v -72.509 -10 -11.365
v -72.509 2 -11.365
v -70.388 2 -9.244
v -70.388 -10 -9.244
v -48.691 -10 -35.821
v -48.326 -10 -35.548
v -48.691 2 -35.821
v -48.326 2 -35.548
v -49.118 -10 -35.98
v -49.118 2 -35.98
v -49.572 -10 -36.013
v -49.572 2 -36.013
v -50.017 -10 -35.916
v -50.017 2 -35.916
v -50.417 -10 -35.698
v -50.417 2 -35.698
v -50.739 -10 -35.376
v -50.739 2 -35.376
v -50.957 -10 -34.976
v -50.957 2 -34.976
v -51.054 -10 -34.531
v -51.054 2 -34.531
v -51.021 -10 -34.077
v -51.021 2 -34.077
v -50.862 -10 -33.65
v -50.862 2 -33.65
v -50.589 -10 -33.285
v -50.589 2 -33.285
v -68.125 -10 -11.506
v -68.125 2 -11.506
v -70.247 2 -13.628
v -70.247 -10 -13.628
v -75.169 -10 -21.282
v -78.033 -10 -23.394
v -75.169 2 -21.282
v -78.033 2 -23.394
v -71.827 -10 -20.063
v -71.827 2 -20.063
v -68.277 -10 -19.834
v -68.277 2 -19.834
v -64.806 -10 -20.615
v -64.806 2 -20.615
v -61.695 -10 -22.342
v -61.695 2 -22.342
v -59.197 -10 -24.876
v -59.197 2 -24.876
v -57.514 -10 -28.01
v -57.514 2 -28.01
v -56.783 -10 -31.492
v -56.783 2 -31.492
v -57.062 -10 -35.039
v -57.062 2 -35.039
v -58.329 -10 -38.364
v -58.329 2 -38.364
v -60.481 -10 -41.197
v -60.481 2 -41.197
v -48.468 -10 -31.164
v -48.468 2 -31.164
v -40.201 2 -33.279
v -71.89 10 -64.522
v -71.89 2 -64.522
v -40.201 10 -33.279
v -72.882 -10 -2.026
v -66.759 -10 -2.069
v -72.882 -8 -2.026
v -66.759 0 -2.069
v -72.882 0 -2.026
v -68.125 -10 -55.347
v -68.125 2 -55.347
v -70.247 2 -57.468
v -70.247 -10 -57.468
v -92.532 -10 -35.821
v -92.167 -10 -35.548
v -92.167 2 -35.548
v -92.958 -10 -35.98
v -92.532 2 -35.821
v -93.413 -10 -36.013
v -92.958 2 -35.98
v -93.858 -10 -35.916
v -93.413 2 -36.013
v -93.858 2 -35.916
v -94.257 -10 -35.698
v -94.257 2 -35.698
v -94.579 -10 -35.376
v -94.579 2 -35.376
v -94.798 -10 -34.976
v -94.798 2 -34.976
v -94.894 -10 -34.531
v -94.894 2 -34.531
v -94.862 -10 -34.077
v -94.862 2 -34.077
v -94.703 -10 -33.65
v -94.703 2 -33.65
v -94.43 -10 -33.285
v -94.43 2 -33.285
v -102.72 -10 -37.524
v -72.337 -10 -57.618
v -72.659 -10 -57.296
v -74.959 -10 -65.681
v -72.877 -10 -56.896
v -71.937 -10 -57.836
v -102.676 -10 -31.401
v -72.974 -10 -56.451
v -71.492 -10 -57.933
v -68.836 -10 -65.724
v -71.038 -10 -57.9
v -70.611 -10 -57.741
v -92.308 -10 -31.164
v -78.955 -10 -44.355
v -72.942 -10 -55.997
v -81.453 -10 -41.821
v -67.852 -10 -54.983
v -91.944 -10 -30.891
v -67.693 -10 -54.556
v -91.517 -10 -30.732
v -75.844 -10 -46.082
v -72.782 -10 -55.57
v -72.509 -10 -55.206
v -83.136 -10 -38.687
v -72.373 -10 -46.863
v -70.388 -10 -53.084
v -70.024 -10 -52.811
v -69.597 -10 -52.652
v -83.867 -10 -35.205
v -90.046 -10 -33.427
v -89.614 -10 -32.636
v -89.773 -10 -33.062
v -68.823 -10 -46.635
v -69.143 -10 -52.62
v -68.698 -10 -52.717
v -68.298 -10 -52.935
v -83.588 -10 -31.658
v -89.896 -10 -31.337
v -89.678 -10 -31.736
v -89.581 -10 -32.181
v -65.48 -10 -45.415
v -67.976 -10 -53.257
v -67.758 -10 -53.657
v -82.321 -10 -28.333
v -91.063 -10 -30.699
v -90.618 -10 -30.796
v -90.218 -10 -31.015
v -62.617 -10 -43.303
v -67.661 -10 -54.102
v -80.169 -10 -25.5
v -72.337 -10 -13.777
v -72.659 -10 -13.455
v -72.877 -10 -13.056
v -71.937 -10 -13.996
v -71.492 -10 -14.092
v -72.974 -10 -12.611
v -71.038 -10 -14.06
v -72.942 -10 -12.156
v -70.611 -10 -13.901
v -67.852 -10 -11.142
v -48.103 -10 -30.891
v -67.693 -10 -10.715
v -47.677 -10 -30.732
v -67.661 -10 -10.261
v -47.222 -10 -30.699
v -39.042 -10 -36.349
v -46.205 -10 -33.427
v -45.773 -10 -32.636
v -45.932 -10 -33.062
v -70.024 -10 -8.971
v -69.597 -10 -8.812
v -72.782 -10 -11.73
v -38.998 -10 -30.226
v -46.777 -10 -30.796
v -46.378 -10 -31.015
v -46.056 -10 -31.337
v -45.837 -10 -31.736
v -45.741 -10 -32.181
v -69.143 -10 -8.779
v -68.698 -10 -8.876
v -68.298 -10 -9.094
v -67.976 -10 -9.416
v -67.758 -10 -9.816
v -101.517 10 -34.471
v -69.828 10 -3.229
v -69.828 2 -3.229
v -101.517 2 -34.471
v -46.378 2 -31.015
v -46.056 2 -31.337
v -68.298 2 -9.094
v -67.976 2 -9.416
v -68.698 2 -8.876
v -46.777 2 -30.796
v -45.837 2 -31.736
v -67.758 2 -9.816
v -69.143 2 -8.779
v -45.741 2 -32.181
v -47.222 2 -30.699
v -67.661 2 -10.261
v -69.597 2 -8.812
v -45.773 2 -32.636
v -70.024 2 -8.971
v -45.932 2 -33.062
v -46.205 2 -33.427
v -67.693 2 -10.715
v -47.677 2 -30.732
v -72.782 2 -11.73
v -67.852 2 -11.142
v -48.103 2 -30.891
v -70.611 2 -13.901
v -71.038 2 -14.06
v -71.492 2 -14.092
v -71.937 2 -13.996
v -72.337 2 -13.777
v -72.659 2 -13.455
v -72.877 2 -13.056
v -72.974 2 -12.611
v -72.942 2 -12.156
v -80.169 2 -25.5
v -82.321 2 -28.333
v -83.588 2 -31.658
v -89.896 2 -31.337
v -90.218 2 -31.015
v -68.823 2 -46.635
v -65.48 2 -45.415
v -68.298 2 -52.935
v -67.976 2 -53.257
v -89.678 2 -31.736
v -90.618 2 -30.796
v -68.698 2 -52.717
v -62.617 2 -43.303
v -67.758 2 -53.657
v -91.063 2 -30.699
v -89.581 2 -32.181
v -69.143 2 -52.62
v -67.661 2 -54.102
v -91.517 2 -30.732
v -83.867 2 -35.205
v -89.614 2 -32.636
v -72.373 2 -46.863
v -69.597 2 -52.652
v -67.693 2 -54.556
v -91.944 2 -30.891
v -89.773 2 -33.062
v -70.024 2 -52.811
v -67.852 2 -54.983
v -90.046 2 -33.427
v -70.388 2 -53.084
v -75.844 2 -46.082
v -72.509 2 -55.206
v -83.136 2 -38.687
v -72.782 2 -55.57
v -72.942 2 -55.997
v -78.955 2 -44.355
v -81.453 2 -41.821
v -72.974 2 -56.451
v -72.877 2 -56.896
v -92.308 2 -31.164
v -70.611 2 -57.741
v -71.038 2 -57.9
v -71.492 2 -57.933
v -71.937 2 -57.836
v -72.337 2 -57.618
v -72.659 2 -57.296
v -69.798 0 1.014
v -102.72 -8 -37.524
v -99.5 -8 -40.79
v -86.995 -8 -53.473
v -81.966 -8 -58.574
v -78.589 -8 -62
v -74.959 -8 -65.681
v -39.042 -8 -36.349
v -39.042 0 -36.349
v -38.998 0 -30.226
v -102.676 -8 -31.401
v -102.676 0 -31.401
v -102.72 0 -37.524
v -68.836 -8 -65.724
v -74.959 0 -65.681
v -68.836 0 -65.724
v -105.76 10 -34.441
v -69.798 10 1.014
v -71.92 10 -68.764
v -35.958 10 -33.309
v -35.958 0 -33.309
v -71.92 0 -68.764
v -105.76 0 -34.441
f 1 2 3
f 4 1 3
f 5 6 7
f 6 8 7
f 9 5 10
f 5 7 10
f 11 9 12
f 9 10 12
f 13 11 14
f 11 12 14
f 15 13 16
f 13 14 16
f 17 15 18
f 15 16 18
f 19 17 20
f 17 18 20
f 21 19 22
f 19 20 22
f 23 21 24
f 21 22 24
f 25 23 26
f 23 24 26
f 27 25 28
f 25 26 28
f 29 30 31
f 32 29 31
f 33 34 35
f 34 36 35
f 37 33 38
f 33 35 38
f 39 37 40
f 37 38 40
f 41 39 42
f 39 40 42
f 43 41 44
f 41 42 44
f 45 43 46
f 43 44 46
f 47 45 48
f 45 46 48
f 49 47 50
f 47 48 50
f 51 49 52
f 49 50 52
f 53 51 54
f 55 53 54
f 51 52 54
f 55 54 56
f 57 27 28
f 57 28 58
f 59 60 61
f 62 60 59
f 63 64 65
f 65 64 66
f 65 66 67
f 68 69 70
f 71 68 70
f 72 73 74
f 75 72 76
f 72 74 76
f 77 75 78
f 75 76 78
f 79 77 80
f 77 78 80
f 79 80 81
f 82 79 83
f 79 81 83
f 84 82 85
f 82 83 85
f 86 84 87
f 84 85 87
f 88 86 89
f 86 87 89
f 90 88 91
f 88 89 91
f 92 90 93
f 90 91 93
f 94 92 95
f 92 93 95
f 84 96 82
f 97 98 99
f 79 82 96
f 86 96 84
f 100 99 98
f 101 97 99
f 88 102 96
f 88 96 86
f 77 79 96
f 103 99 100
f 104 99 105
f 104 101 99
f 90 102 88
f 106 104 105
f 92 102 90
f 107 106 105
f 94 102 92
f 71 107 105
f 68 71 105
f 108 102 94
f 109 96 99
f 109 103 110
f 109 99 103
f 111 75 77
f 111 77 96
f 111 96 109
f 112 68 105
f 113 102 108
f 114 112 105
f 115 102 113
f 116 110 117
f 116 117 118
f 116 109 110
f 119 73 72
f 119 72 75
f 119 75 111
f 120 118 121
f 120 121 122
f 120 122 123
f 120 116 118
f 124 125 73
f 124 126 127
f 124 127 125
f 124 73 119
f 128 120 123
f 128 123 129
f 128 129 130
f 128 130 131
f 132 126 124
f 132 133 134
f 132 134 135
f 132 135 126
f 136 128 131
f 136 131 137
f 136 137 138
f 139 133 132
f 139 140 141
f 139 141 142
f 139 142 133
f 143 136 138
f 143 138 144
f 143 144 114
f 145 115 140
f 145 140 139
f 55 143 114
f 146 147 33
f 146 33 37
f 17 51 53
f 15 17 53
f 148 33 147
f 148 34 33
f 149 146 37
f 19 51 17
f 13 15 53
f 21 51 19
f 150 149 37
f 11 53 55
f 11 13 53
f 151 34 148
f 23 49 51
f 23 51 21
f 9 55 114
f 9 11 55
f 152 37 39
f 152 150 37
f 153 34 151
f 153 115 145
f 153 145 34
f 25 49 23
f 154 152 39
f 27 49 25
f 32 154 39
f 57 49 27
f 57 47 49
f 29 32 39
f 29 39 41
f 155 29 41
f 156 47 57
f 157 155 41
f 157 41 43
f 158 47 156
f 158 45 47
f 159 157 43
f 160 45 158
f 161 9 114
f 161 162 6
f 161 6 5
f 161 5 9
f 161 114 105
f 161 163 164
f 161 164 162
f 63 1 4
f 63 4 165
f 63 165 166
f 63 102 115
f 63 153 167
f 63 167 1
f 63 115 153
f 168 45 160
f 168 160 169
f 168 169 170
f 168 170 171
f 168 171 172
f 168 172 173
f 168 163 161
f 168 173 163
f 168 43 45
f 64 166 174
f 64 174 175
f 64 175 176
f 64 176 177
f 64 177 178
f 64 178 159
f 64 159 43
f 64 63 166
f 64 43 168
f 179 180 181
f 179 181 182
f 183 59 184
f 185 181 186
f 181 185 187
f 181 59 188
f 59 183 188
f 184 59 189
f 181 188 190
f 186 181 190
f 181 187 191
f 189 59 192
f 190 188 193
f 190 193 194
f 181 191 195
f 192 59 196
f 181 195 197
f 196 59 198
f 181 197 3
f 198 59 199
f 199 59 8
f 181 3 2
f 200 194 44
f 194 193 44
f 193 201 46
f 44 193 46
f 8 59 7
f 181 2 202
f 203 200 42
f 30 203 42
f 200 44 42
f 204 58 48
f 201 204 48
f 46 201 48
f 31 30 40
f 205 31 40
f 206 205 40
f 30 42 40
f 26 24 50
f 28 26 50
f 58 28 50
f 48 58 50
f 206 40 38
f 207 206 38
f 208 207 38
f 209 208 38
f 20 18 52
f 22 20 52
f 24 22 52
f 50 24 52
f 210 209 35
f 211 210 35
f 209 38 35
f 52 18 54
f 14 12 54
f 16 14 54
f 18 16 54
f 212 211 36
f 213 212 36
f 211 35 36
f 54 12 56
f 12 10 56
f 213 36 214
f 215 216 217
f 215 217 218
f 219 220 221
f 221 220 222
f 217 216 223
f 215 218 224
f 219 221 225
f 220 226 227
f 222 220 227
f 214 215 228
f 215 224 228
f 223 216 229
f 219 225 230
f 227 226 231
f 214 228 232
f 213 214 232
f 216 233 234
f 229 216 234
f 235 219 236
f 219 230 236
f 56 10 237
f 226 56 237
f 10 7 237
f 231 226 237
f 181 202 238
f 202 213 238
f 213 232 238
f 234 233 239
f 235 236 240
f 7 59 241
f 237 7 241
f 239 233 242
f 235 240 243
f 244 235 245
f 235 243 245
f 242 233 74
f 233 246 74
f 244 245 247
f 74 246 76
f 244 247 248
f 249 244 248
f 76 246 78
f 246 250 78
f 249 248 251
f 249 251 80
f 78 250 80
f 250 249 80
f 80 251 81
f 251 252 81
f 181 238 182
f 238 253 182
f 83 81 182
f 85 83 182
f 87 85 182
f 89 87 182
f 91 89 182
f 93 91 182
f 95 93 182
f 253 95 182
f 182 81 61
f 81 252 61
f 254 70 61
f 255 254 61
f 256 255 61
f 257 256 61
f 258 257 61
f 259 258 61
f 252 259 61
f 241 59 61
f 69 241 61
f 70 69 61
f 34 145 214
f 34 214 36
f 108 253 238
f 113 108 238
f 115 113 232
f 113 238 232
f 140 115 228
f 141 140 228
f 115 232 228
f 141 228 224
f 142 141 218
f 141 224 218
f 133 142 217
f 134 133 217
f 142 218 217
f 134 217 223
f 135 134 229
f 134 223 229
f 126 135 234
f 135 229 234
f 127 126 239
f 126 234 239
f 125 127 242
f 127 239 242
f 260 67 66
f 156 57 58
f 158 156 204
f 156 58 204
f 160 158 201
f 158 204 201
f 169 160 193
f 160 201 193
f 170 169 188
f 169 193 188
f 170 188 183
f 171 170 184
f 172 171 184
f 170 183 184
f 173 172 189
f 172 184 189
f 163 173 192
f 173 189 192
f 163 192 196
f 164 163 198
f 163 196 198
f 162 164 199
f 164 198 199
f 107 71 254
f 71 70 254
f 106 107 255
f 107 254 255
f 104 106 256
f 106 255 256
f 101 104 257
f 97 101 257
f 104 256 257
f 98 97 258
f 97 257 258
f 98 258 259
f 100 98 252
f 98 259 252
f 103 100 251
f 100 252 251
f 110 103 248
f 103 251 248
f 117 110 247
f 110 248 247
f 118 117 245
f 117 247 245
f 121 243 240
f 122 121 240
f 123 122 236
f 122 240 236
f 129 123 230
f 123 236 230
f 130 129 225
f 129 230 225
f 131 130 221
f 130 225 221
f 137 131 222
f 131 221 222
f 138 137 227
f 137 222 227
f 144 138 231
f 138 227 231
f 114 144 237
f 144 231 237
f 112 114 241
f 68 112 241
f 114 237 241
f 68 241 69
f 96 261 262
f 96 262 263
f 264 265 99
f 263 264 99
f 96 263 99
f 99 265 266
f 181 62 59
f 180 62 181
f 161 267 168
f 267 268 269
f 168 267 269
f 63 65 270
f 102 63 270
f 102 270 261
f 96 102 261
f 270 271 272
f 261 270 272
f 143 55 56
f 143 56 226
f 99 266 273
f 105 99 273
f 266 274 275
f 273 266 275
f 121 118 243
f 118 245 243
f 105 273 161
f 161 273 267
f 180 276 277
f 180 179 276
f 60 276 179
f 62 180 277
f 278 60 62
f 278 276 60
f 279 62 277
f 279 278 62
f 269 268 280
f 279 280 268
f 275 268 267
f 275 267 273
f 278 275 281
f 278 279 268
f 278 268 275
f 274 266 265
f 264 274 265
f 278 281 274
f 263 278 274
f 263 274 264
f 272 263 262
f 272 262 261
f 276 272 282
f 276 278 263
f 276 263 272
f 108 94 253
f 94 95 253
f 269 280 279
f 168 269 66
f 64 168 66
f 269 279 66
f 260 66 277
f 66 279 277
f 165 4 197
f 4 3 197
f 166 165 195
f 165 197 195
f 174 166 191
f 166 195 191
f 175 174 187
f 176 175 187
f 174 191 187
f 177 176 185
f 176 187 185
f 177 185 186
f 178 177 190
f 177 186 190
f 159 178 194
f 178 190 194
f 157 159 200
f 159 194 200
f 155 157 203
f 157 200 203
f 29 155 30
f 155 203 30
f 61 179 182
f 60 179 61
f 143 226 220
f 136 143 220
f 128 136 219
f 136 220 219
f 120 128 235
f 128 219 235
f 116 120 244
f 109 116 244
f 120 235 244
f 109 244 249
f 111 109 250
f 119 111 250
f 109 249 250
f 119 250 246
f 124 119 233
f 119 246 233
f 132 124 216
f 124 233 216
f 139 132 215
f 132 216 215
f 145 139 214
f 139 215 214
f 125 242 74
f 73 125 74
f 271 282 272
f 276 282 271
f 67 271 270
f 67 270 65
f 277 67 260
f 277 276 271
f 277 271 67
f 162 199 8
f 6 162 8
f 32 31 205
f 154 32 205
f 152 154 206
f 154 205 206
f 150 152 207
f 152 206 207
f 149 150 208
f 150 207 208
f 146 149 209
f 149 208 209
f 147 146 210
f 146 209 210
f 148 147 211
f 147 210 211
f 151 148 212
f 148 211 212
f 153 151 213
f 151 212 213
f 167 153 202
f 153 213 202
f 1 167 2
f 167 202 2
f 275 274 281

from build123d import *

# Parameters (mm, degrees)
SKETCH1_W                  = 215
SKETCH1_H                  = 140
BOSS_EXTRUDE1_DEPTH        = 10
FILLET1_R                  = 60
SKETCH2_R                  = 20
SKETCH2_R_2                = 7.5
CUT_EXTRUDE1_DEPTH         = 129.671092325
CUT_EXTRUDE2_DEPTH         = 129.671092325
CUT_EXTRUDE3_DEPTH         = 129.671092325
SKETCH5_R                  = 11
CUT_EXTRUDE4_DEPTH         = 7
SKETCH6_R                  = 14
SKETCH6_R_2                = 11
BOSS_EXTRUDE2_DEPTH        = 8.5
SKETCH7_R                  = 23.5
CUT_EXTRUDE5_DEPTH         = 7
SKETCH8_R                  = 38.5
SKETCH8_R_2                = 30.5
BOSS_EXTRUDE3_DEPTH        = 8
BOSS_EXTRUDE4_DEPTH        = 35
BOSS_EXTRUDE5_DEPTH        = 8
CUT_EXTRUDE6_DEPTH         = 8
SKETCH12_R                 = 11
SKETCH12_R_2               = 7.5
BOSS_EXTRUDE6_DEPTH        = 0.5
BOSS_EXTRUDE7_REACH        = 137.946
SKETCH14_R                 = 2.05
CUT_EXTRUDE7_DEPTH         = 3.6
BOSS_EXTRUDE8_REACH        = 137.946
SKETCH16_R                 = 2.05
CUT_EXTRUDE8_START         = -3.6
CUT_EXTRUDE8_OUTLINE_R     = 2.05
CUT_EXTRUDE8_DEPTH         = 3.6
LPATTERN1_COUNT            = 3
LPATTERN1_PITCH            = 55
MIRROR2_COPY_1_REACH       = 137.946
MIRROR2_COPY_1_SKETCH_R    = 2.05
MIRROR2_COPY_2_REACH       = 137.946
MIRROR2_COPY_2_SKETCH_R    = 2.05
MIRROR2_START              = -3.6
MIRROR2_COPY_3_SKETCH_R    = 2.05
MIRROR2_COPY_3_DEPTH       = 3.6
MIRROR2_COPY_4_SKETCH_R    = 2.05
MIRROR2_COPY_4_DEPTH       = 3.6
BOSS_EXTRUDE9_REACH        = 137.946
SKETCH18_R                 = 2.05
CUT_EXTRUDE9_DEPTH         = 3.6
BOSS_EXTRUDE10_DEPTH       = 8
CUT_EXTRUDE10_DEPTH        = 133.97086147
SKETCH22_R                 = 1.6
CUT_EXTRUDE11_DEPTH        = 133.97086147
SKETCH23_R                 = 2.05
CUT_EXTRUDE12_DEPTH        = 133.97086147
CUT_EXTRUDE13_REACH        = 230.801
SKETCH24_R                 = 2.05
CROQUIS1_OUTSIDE_W         = 269.096
CROQUIS1_OUTSIDE_H         = 194.096
CORTAR_EXTRUIR1_DEPTH      = 136.945761243
CORTAR_EXTRUIR2_DEPTH      = 131.754479901
CORTAR_EXTRUIR2_DEPTH_BACK = 131.754479901
CROQUIS2_OUTSIDE_W         = 122.389
CROQUIS2_OUTSIDE_H         = 68.694
CROQUIS2_OUTSIDE_W_2       = 50.5
CROQUIS2_OUTSIDE_H_2       = 18
CORTAR_EXTRUIR3_DEPTH      = 128.426864322
CORTAR_EXTRUIR3_DEPTH_BACK = 8
CROQUIS3_OUTSIDE_W         = 91.868
CROQUIS3_OUTSIDE_H         = 91.844
SALIENTE_EXTRUIR1_DEPTH    = 2


# Read off the part's stored shape, not the designer's step: Cut-Extrude8
with BuildPart() as part:
    # Sketch1 → Boss-Extrude1 (new body)
    with BuildSketch(Plane(origin=(0, 0, 0), x_dir=(1, 0, 0), z_dir=(0, 1, 0))):
        Rectangle(SKETCH1_W, SKETCH1_H)
    extrude(amount=BOSS_EXTRUDE1_DEPTH)

    # Fillet1
    fillet1_edges = [part.edges().sort_by_distance(p)[0] for p in [
        (107.5, 5, 70),
        (107.5, 5, -70),
    ]]
    fillet(fillet1_edges, radius=FILLET1_R)

    # Sketch2 → Cut-Extrude1 (cut, through all)
    with BuildSketch(Plane(origin=(0, 10, 0), x_dir=(1, 0, 0), z_dir=(0, 1, 0))):
        with Locations(Location((42.5, 0, 0), (0, 0, 270))):
            Circle(SKETCH2_R)
        with Locations(Location((-36.5, 0, 0), (0, 0, 270))):
            Circle(SKETCH2_R_2)
    extrude(amount=-CUT_EXTRUDE1_DEPTH, mode=Mode.SUBTRACT)

    # Sketch3 → Cut-Extrude2 (cut, through all)
    with BuildSketch(Plane(origin=(0, 10, 0), x_dir=(1, 0, 0), z_dir=(0, 1, 0))):
        with BuildLine():
            Line((-62.6171596, 43.302932631), (-60.480848158, 41.196710083))
            ThreePointArc((-60.480848158, 41.196710083), (-60.355477768, 23.519485123), (-78.032702727, 23.394114734))
            Line((-78.032702727, 23.394114734), (-80.169014169, 25.500337282))
            ThreePointArc((-80.169014169, 25.500337282), (-80.294384559, 43.177562241), (-62.6171596, 43.302932631))
        make_face()
    extrude(amount=-CUT_EXTRUDE2_DEPTH, mode=Mode.SUBTRACT)

    # Sketch4 → Cut-Extrude3 (cut, through all)
    with BuildSketch(Plane(origin=(0, 10, 0), x_dir=(1, 0, 0), z_dir=(0, 1, 0))):
        with BuildLine():
            Line((-48.467836076, 31.164041558), (-50.589156419, 33.285361902))
            ThreePointArc((-50.589156419, 33.285361902), (-50.589156419, 35.548103602), (-48.326414719, 35.548103602))
            Line((-48.326414719, 35.548103602), (-46.205094376, 33.426783258))
            ThreePointArc((-46.205094376, 33.426783258), (-46.205094376, 31.164041558), (-48.467836076, 31.164041558))
        make_face()
        with BuildLine():
            Line((-70.388146292, 53.084351775), (-72.509466636, 55.205672119))
            ThreePointArc((-72.509466636, 55.205672119), (-72.509466636, 57.468413818), (-70.246724936, 57.468413818))
            Line((-70.246724936, 57.468413818), (-68.125404593, 55.347093475))
            ThreePointArc((-68.125404593, 55.347093475), (-68.125404593, 53.084351775), (-70.388146292, 53.084351775))
        make_face()
        with BuildLine():
            Line((-70.388146292, 9.243731341), (-72.509466636, 11.365051685))
            ThreePointArc((-72.509466636, 11.365051685), (-72.509466636, 13.627793385), (-70.246724936, 13.627793385))
            Line((-70.246724936, 13.627793385), (-68.125404593, 11.506473041))
            ThreePointArc((-68.125404593, 11.506473041), (-68.125404593, 9.243731341), (-70.388146292, 9.243731341))
        make_face()
        with BuildLine():
            Line((-92.308456509, 31.164041558), (-94.429776853, 33.285361902))
            ThreePointArc((-94.429776853, 33.285361902), (-94.429776853, 35.548103602), (-92.167035153, 35.548103602))
            Line((-92.167035153, 35.548103602), (-90.045714809, 33.426783258))
            ThreePointArc((-90.045714809, 33.426783258), (-90.045714809, 31.164041558), (-92.308456509, 31.164041558))
        make_face()
    extrude(amount=-CUT_EXTRUDE3_DEPTH, mode=Mode.SUBTRACT)

    # Sketch5 → Cut-Extrude4 (cut)
    with BuildSketch(Plane(origin=(0, 10, 0), x_dir=(1, 0, 0), z_dir=(0, 1, 0))):
        with Locations(Location((-36.5, 0, 0), (0, 0, 270))):
            Circle(SKETCH5_R)
    extrude(amount=-CUT_EXTRUDE4_DEPTH, mode=Mode.SUBTRACT)

    # Sketch6 → Boss-Extrude2 (add)
    with BuildSketch(Plane.XZ):
        with Locations(Location((-36.5, 0, 0), (0, 0, 270))):
            Circle(SKETCH6_R)
        with Locations(Location((-36.5, 0, 0), (0, 0, 90))):
            Circle(SKETCH6_R_2, mode=Mode.SUBTRACT)
    extrude(amount=BOSS_EXTRUDE2_DEPTH)

    # Sketch7 → Cut-Extrude5 (cut)
    with BuildSketch(Plane.XZ):
        with Locations(Location((42.5, 0, 0), (0, 0, 270))):
            Circle(SKETCH7_R)
    extrude(amount=-CUT_EXTRUDE5_DEPTH, mode=Mode.SUBTRACT)

    # Sketch8 → Boss-Extrude3 (add)
    with BuildSketch(Plane.XZ):
        with Locations(Location((42.5, 0, 0), (0, 0, 270))):
            Circle(SKETCH8_R)
        with Locations(Location((42.5, 0, 0), (0, 0, 270))):
            Circle(SKETCH8_R_2, mode=Mode.SUBTRACT)
    extrude(amount=BOSS_EXTRUDE3_DEPTH)

    # Sketch9 → Boss-Extrude4 (add)
    with BuildSketch(Plane.XZ):
        with BuildLine():
            Line((-107.5, -70), (47.5, -70))
            ThreePointArc((47.5, -70), (89.926406871, -52.426406871), (107.5, -10))
            Line((107.5, -10), (107.5, 10))
            ThreePointArc((107.5, 10), (89.926406871, 52.426406871), (47.5, 70))
            Line((47.5, 70), (-107.5, 70))
            Line((-107.5, 70), (-107.5, -70))
        make_face()
        with BuildLine():
            Line((47.5, 62), (-99.5, 62))
            Line((-99.5, 62), (-99.5, -62))
            Line((-99.5, -62), (47.5, -62))
            ThreePointArc((47.5, -62), (84.269552622, -46.769552622), (99.5, -10))
            Line((99.5, -10), (99.5, 10))
            ThreePointArc((99.5, 10), (84.269552622, 46.769552622), (47.5, 62))
        make_face(mode=Mode.SUBTRACT)
    extrude(amount=BOSS_EXTRUDE4_DEPTH)

    # Sketch10 → Boss-Extrude5 (add)
    with BuildSketch(Plane.XZ):
        with BuildLine():
            Line((-36.5, -14), (-36.5, -62))
            Line((-36.5, -62), (-99.5, -62))
            Line((-99.5, -62), (-99.5, 0))
            Line((-99.5, 0), (-50.5, 0))
            ThreePointArc((-50.5, 0), (-46.399494937, -9.899494937), (-36.5, -14))
        make_face()
        with BuildLine():
            Line((-80.169014169, -25.500337282), (-78.032702727, -23.394114734))
            ThreePointArc((-78.032702727, -23.394114734), (-60.355477768, -23.519485123), (-60.480848158, -41.196710083))
            Line((-60.480848158, -41.196710083), (-62.6171596, -43.302932631))
            ThreePointArc((-62.6171596, -43.302932631), (-80.294384559, -43.177562241), (-80.169014169, -25.500337282))
        make_face(mode=Mode.SUBTRACT)
        with BuildLine():
            Line((-94.429776853, -33.285361902), (-92.308456509, -31.164041558))
            ThreePointArc((-92.308456509, -31.164041558), (-90.045714809, -31.164041558), (-90.045714809, -33.426783258))
            Line((-90.045714809, -33.426783258), (-92.167035153, -35.548103602))
            ThreePointArc((-92.167035153, -35.548103602), (-94.429776853, -35.548103602), (-94.429776853, -33.285361902))
        make_face(mode=Mode.SUBTRACT)
        with BuildLine():
            Line((-68.125404593, -55.347093475), (-70.246724936, -57.468413818))
            ThreePointArc((-70.246724936, -57.468413818), (-72.509466636, -57.468413818), (-72.509466636, -55.205672119))
            Line((-72.509466636, -55.205672119), (-70.388146292, -53.084351775))
            ThreePointArc((-70.388146292, -53.084351775), (-68.125404593, -53.084351775), (-68.125404593, -55.347093475))
        make_face(mode=Mode.SUBTRACT)
        with BuildLine():
            Line((-46.205094376, -33.426783258), (-48.326414719, -35.548103602))
            ThreePointArc((-48.326414719, -35.548103602), (-50.589156419, -35.548103602), (-50.589156419, -33.285361902))
            Line((-50.589156419, -33.285361902), (-48.467836076, -31.164041558))
            ThreePointArc((-48.467836076, -31.164041558), (-46.205094376, -31.164041558), (-46.205094376, -33.426783258))
        make_face(mode=Mode.SUBTRACT)
        with BuildLine():
            Line((-68.125404593, -11.506473041), (-70.246724936, -13.627793385))
            ThreePointArc((-70.246724936, -13.627793385), (-72.509466636, -13.627793385), (-72.509466636, -11.365051685))
            Line((-72.509466636, -11.365051685), (-70.388146292, -9.243731341))
            ThreePointArc((-70.388146292, -9.243731341), (-68.125404593, -9.243731341), (-68.125404593, -11.506473041))
        make_face(mode=Mode.SUBTRACT)
    extrude(amount=BOSS_EXTRUDE5_DEPTH)

    # Sketch11 → Cut-Extrude6 (cut)
    with BuildSketch(Plane(origin=(0, 10, 0), x_dir=(1, 0, 0), z_dir=(0, 1, 0))):
        Polygon((-101.517084141, 34.470839412), (-71.889553628, 64.521620361), (-40.200933906, 33.279319227), (-69.82846442, 3.228538278), align=None)
    extrude(amount=-CUT_EXTRUDE6_DEPTH, mode=Mode.SUBTRACT)

    # Sketch12 → Boss-Extrude6 (add)
    with BuildSketch(Plane.XZ):
        with Locations(Location((-36.5, 0, 0), (0, 0, 90))):
            Circle(SKETCH12_R)
        with Locations(Location((-36.5, 0, 0), (0, 0, 90))):
            Circle(SKETCH12_R_2, mode=Mode.SUBTRACT)
    extrude(amount=BOSS_EXTRUDE6_DEPTH)

    # Sketch14 → Boss-Extrude7 (add, up to next)
    with BuildSketch(Plane.XZ.offset(35), mode=Mode.PRIVATE) as boss_extrude7_sk1:
        with BuildLine():
            Line((61.391194045, 60.110225783), (60.333474536, 57.556665))
            ThreePointArc((60.333474536, 57.556665), (63.337112892, 50.305240545), (70.588537347, 53.308878901))
            Line((70.588537347, 53.308878901), (71.711379603, 56.019659904))
            ThreePointArc((71.711379603, 56.019659904), (66.660759692, 58.341134534), (61.391194045, 60.110225783))
        make_face()
        with Locations(Location((65.461005942, 55.432771951, 0), (0, 0, 270))):
            Circle(SKETCH14_R, mode=Mode.SUBTRACT)
    boss_extrude7_tool1 = extrude(boss_extrude7_sk1.sketch, amount=-BOSS_EXTRUDE7_REACH, mode=Mode.PRIVATE) - part.part
    # Sketch14 → Boss-Extrude7 (add, up to next)
    with BuildSketch(Plane.XZ.offset(35), mode=Mode.PRIVATE) as boss_extrude7_sk2:
        with BuildLine():
            ThreePointArc((98.972980454, 17.3845977), (97.876725035, 22.891298414), (96.193134966, 28.247701421))
            Line((96.193134966, 28.247701421), (93.037240304, 26.94048705))
            ThreePointArc((93.037240304, 26.94048705), (90.033601948, 19.689062595), (97.285026403, 16.685424239))
            Line((97.285026403, 16.685424239), (98.972980454, 17.3845977))
        make_face()
        with Locations(Location((95.161133353, 21.812955645, 0), (0, 0, 270))):
            Circle(SKETCH14_R, mode=Mode.SUBTRACT)
    boss_extrude7_tool2 = extrude(boss_extrude7_sk2.sketch, amount=-BOSS_EXTRUDE7_REACH, mode=Mode.PRIVATE) - part.part
    boss_extrude7_1 = boss_extrude7_tool1.solids().sort_by_distance((61.006604, -35, 58.773687))[0]
    add(boss_extrude7_1)
    boss_extrude7_2 = boss_extrude7_tool2.solids().sort_by_distance((97.729394, -35, 22.853597))[0]
    add(boss_extrude7_2)
    boss_extrude7 = boss_extrude7_1 + boss_extrude7_2  # Boss-Extrude7 as one shape, for the pattern or mirror that repeats it

    # Sketch15 → Cut-Extrude7 (cut)
    with BuildSketch(Plane(origin=(0, -25, 0), x_dir=(-1, 0, 0), z_dir=(0, -1, 0))):
        with BuildLine():
            Line((-92.636291132, -16.870519833), (-98.459041258, -19.282381905))
            Line((-98.459041258, -19.282381905), (-99.00162845, -23.4037408))
            Line((-99.00162845, -23.4037408), (-95.703720545, -25.93431454))
            Line((-95.703720545, -25.93431454), (-89.880970419, -23.522452467))
            ThreePointArc((-89.880970419, -23.522452467), (-90.033601948, -19.689062595), (-92.636291132, -16.870519833))
        make_face()
        with BuildLine():
            Line((-67.170502764, -50.152609016), (-69.582364837, -55.975359143))
            Line((-69.582364837, -55.975359143), (-67.051791097, -59.273267048))
            Line((-67.051791097, -59.273267048), (-62.930432203, -58.730679856))
            Line((-62.930432203, -58.730679856), (-60.51857013, -52.907929729))
            ThreePointArc((-60.51857013, -52.907929729), (-63.337112892, -50.305240545), (-67.170502764, -50.152609016))
        make_face()
    cut_extrude7 = extrude(amount=-CUT_EXTRUDE7_DEPTH, mode=Mode.SUBTRACT)

    # Mirror1: Boss-Extrude7, Cut-Extrude7 across plane
    add(boss_extrude7.mirror(Plane.XY))
    add(cut_extrude7.mirror(Plane.XY), mode=Mode.SUBTRACT)

    # Sketch16 → Boss-Extrude8 (add, up to next)
    with BuildSketch(Plane.XZ.offset(35), mode=Mode.PRIVATE) as boss_extrude8_sk1:
        with BuildLine():
            Line((16.95, 59), (16.95, 62))
            Line((16.95, 62), (28.05, 62))
            Line((28.05, 62), (28.05, 59))
            ThreePointArc((28.05, 59), (22.5, 53.45), (16.95, 59))
        make_face()
        with Locations(Location((22.5, 59, 0), (0, 0, 270))):
            Circle(SKETCH16_R, mode=Mode.SUBTRACT)
    boss_extrude8_tool1 = extrude(boss_extrude8_sk1.sketch, amount=-BOSS_EXTRUDE8_REACH, mode=Mode.PRIVATE) - part.part
    boss_extrude8 = boss_extrude8_tool1.solids().sort_by_distance((17.090112, -35, 60.5))[0]
    add(boss_extrude8)

    # Cut-Extrude8 outline → Cut-Extrude8 (cut)
    with BuildSketch(Plane(origin=(0, -25, 0), x_dir=(-1, 0, 0), z_dir=(0, -1, 0)).offset(CUT_EXTRUDE8_START)):
        with BuildLine():
            Line((-22.5, -63.156921938), (-18.9, -61.078460969))
            Line((-18.9, -61.078460969), (-18.9, -54.775961648))
            ThreePointArc((-18.9, -54.775961648), (-22.5, -53.45), (-26.1, -54.775961648))
            Line((-26.1, -54.775961648), (-26.1, -61.078460969))
            Line((-26.1, -61.078460969), (-22.5, -63.156921938))
        make_face()
        with Locations((-22.5, -59)):
            Circle(CUT_EXTRUDE8_OUTLINE_R, mode=Mode.SUBTRACT)
    cut_extrude8 = extrude(amount=CUT_EXTRUDE8_DEPTH, mode=Mode.SUBTRACT)

    # LPattern1: Boss-Extrude8, Cut-Extrude8 ×3
    with Locations(*[(-i * LPATTERN1_PITCH, 0, 0) for i in range(1, LPATTERN1_COUNT)]):
        add(boss_extrude8)
        add(cut_extrude8, mode=Mode.SUBTRACT)

    # Mirror2: Boss-Extrude8, Cut-Extrude8 across plane
    add(boss_extrude8.mirror(Plane.XY))
    add(cut_extrude8.mirror(Plane.XY), mode=Mode.SUBTRACT)

    # Mirror2 copy 1 sketch → Mirror2 copy 1 (add, up to next)
    with BuildSketch(Plane(origin=(-55, -35, 0), x_dir=(1, 0, 0), z_dir=(0, -1, 0)), mode=Mode.PRIVATE) as mirror2_copy_1_sk1:
        with BuildLine():
            Line((16.95, -59), (16.95, -62))
            Line((16.95, -62), (28.05, -62))
            Line((28.05, -62), (28.05, -59))
            ThreePointArc((28.05, -59), (22.5, -53.45), (16.95, -59))
        make_face()
        with Locations((22.5, -59)):
            Circle(MIRROR2_COPY_1_SKETCH_R, mode=Mode.SUBTRACT)
    mirror2_copy_1_tool1 = extrude(mirror2_copy_1_sk1.sketch, amount=-MIRROR2_COPY_1_REACH, mode=Mode.PRIVATE) - part.part
    add(mirror2_copy_1_tool1.solids().sort_by_distance((-37.909888, -35, -60.5))[0])

    # Mirror2 copy 2 sketch → Mirror2 copy 2 (add, up to next)
    with BuildSketch(Plane(origin=(-110, -35, 0), x_dir=(1, 0, 0), z_dir=(0, -1, 0)), mode=Mode.PRIVATE) as mirror2_copy_2_sk1:
        with BuildLine():
            Line((16.95, -59), (16.95, -62))
            Line((16.95, -62), (28.05, -62))
            Line((28.05, -62), (28.05, -59))
            ThreePointArc((28.05, -59), (22.5, -53.45), (16.95, -59))
        make_face()
        with Locations((22.5, -59)):
            Circle(MIRROR2_COPY_2_SKETCH_R, mode=Mode.SUBTRACT)
    mirror2_copy_2_tool1 = extrude(mirror2_copy_2_sk1.sketch, amount=-MIRROR2_COPY_2_REACH, mode=Mode.PRIVATE) - part.part
    add(mirror2_copy_2_tool1.solids().sort_by_distance((-92.909888, -35, -60.5))[0])

    # Mirror2 copy 3 sketch → Mirror2 copy 3 (cut)
    with BuildSketch(Plane(origin=(-55, -25, 0), x_dir=(-1, 0, 0), z_dir=(0, -1, 0)).offset(MIRROR2_START)):
        with BuildLine():
            Line((-22.5, 63.156921938), (-18.9, 61.078460969))
            Line((-18.9, 61.078460969), (-18.9, 54.775961648))
            ThreePointArc((-18.9, 54.775961648), (-22.5, 53.45), (-26.1, 54.775961648))
            Line((-26.1, 54.775961648), (-26.1, 61.078460969))
            Line((-26.1, 61.078460969), (-22.5, 63.156921938))
        make_face()
        with Locations((-22.5, 59)):
            Circle(MIRROR2_COPY_3_SKETCH_R, mode=Mode.SUBTRACT)
    extrude(amount=MIRROR2_COPY_3_DEPTH, mode=Mode.SUBTRACT)

    # Mirror2 copy 4 sketch → Mirror2 copy 4 (cut)
    with BuildSketch(Plane(origin=(-110, -25, 0), x_dir=(-1, 0, 0), z_dir=(0, -1, 0)).offset(MIRROR2_START)):
        with BuildLine():
            Line((-22.5, 63.156921938), (-18.9, 61.078460969))
            Line((-18.9, 61.078460969), (-18.9, 54.775961648))
            ThreePointArc((-18.9, 54.775961648), (-22.5, 53.45), (-26.1, 54.775961648))
            Line((-26.1, 54.775961648), (-26.1, 61.078460969))
            Line((-26.1, 61.078460969), (-22.5, 63.156921938))
        make_face()
        with Locations((-22.5, 59)):
            Circle(MIRROR2_COPY_4_SKETCH_R, mode=Mode.SUBTRACT)
    extrude(amount=MIRROR2_COPY_4_DEPTH, mode=Mode.SUBTRACT)

    # Sketch18 → Boss-Extrude9 (add, up to next)
    with BuildSketch(Plane.XZ.offset(35), mode=Mode.PRIVATE) as boss_extrude9_sk1:
        with BuildLine():
            Line((-96.5, 28.55), (-99.5, 28.55))
            Line((-99.5, 28.55), (-99.5, 17.45))
            Line((-99.5, 17.45), (-96.5, 17.45))
            ThreePointArc((-96.5, 17.45), (-90.95, 23), (-96.5, 28.55))
        make_face()
        with Locations(Location((-96.5, 23, 0), (0, 0, 270))):
            Circle(SKETCH18_R, mode=Mode.SUBTRACT)
    boss_extrude9_tool1 = extrude(boss_extrude9_sk1.sketch, amount=-BOSS_EXTRUDE9_REACH, mode=Mode.PRIVATE) - part.part
    boss_extrude9 = boss_extrude9_tool1.solids().sort_by_distance((-98, -35, 28.409888))[0]
    add(boss_extrude9)

    # Sketch19 → Cut-Extrude9 (cut)
    with BuildSketch(Plane(origin=(0, -25, 0), x_dir=(-1, 0, 0), z_dir=(0, -1, 0))):
        with BuildLine():
            Line((98.578460969, -19.4), (92.275961648, -19.4))
            ThreePointArc((92.275961648, -19.4), (90.95, -23), (92.275961648, -26.6))
            Line((92.275961648, -26.6), (98.578460969, -26.6))
            Line((98.578460969, -26.6), (100.656921938, -23))
            Line((100.656921938, -23), (98.578460969, -19.4))
        make_face()
    cut_extrude9 = extrude(amount=-CUT_EXTRUDE9_DEPTH, mode=Mode.SUBTRACT)

    # Mirror3: Boss-Extrude9, Cut-Extrude9 across plane
    add(boss_extrude9.mirror(Plane.XY))
    add(cut_extrude9.mirror(Plane.XY), mode=Mode.SUBTRACT)

    # Sketch20 → Boss-Extrude10 (add)
    with BuildSketch(Plane.XZ):
        with BuildLine():
            Line((-25.156854249, 62), (12.595291742, 24.247854008))
            ThreePointArc((12.595291742, 24.247854008), (15.276388924, 27.223611076), (18.252145992, 29.904708258))
            Line((18.252145992, 29.904708258), (-13.843145751, 62))
            Line((-13.843145751, 62), (-25.156854249, 62))
        make_face()
        with BuildLine():
            Line((38.5, 62), (38.5, 38.291643997))
            ThreePointArc((38.5, 38.291643997), (42.5, 38.5), (46.5, 38.291643997))
            Line((46.5, 38.291643997), (46.5, 62))
            Line((46.5, 62), (38.5, 62))
        make_face()
        with BuildLine():
            Line((83.939658706, 47.096512955), (66.747854008, 29.904708258))
            ThreePointArc((66.747854008, 29.904708258), (69.723611076, 27.223611076), (72.404708258, 24.247854008))
            Line((72.404708258, 24.247854008), (89.209849092, 41.052994843))
            ThreePointArc((89.209849092, 41.052994843), (86.691420235, 44.176491627), (83.939658706, 47.096512955))
        make_face()
        with BuildLine():
            ThreePointArc((81, 0), (80.947875714, -2.002711426), (80.791643997, -4))
            Line((80.791643997, -4), (99.5, -4))
            Line((99.5, -4), (99.5, 4))
            Line((99.5, 4), (80.791643997, 4))
            ThreePointArc((80.791643997, 4), (80.947875714, 2.002711426), (81, 0))
        make_face()
        with BuildLine():
            ThreePointArc((72.404708258, -24.247854008), (69.723611076, -27.223611076), (66.747854008, -29.904708258))
            Line((66.747854008, -29.904708258), (83.939658706, -47.096512955))
            ThreePointArc((83.939658706, -47.096512955), (86.691420235, -44.176491627), (89.209849092, -41.052994843))
            Line((89.209849092, -41.052994843), (72.404708258, -24.247854008))
        make_face()
        with BuildLine():
            ThreePointArc((46.5, -38.291643997), (42.5, -38.5), (38.5, -38.291643997))
            Line((38.5, -38.291643997), (38.5, -62))
            Line((38.5, -62), (46.5, -62))
            Line((46.5, -62), (46.5, -38.291643997))
        make_face()
        with BuildLine():
            Line((12.595291742, -24.247854008), (-25.156854249, -62))
            Line((-25.156854249, -62), (-13.843145751, -62))
            Line((-13.843145751, -62), (18.252145992, -29.904708258))
            ThreePointArc((18.252145992, -29.904708258), (15.276388924, -27.223611076), (12.595291742, -24.247854008))
        make_face()
    extrude(amount=BOSS_EXTRUDE10_DEPTH)

    # Sketch21 → Cut-Extrude10 (cut, through all)
    with BuildSketch(Plane.XZ):
        with BuildLine():
            Line((-5, 12), (-5, 24))
            ThreePointArc((-5, 24), (-2.5, 26.5), (0, 24))
            Line((0, 24), (0, 12))
            ThreePointArc((0, 12), (-2.5, 9.5), (-5, 12))
        make_face()
        with BuildLine():
            Line((0, -12), (0, -24))
            ThreePointArc((0, -24), (-2.5, -26.5), (-5, -24))
            Line((-5, -24), (-5, -12))
            ThreePointArc((-5, -12), (-2.5, -9.5), (0, -12))
        make_face()
    extrude(amount=-CUT_EXTRUDE10_DEPTH, mode=Mode.SUBTRACT)

    # Sketch22 → Cut-Extrude11 (cut, through all)
    with BuildSketch(Plane.XZ):
        with Locations(Location((-5.5, -2, 0), (0, 0, 270))):
            Circle(SKETCH22_R)
        with Locations(Location((-13.888002132, 2.459979846, 0), (0, 0, 270))):
            Circle(SKETCH22_R)
    extrude(amount=-CUT_EXTRUDE11_DEPTH, mode=Mode.SUBTRACT)

    # Sketch23 → Cut-Extrude12 (cut, through all)
    with BuildSketch(Plane.XZ):
        with Locations(Location((-87.5, 8, 0), (0, 0, 270))):
            Circle(SKETCH23_R)
        with Locations(Location((-75.5, 8, 0), (0, 0, 270))):
            Circle(SKETCH23_R)
        with Locations(Location((-28.5, -36, 0), (0, 0, 270))):
            Circle(SKETCH23_R)
        with Locations(Location((-28.5, -48, 0), (0, 0, 270))):
            Circle(SKETCH23_R)
        with Locations(Location((-16.5, -42, 0), (0, 0, 270))):
            Circle(SKETCH23_R)
    extrude(amount=-CUT_EXTRUDE12_DEPTH, mode=Mode.SUBTRACT)

    # Sketch24 → Cut-Extrude13 (cut, up to next)
    with BuildSketch(Plane.ZY.offset(107.5), mode=Mode.PRIVATE) as cut_extrude13_sk1:
        with Locations((0, -27)):
            Circle(SKETCH24_R)
    cut_extrude13_tool1 = extrude(cut_extrude13_sk1.sketch, amount=-CUT_EXTRUDE13_REACH, mode=Mode.PRIVATE) & part.part
    # Sketch24 → Cut-Extrude13 (cut, up to next)
    with BuildSketch(Plane.ZY.offset(107.5), mode=Mode.PRIVATE) as cut_extrude13_sk2:
        with Locations((0, -13)):
            Circle(SKETCH24_R)
    cut_extrude13_tool2 = extrude(cut_extrude13_sk2.sketch, amount=-CUT_EXTRUDE13_REACH, mode=Mode.PRIVATE) & part.part
    # Sketch24 → Cut-Extrude13 (cut, up to next)
    with BuildSketch(Plane.ZY.offset(107.5), mode=Mode.PRIVATE) as cut_extrude13_sk3:
        with Locations((-50, -13)):
            Circle(SKETCH24_R)
    cut_extrude13_tool3 = extrude(cut_extrude13_sk3.sketch, amount=-CUT_EXTRUDE13_REACH, mode=Mode.PRIVATE) & part.part
    # Sketch24 → Cut-Extrude13 (cut, up to next)
    with BuildSketch(Plane.ZY.offset(107.5), mode=Mode.PRIVATE) as cut_extrude13_sk4:
        with Locations((-50, -27)):
            Circle(SKETCH24_R)
    cut_extrude13_tool4 = extrude(cut_extrude13_sk4.sketch, amount=-CUT_EXTRUDE13_REACH, mode=Mode.PRIVATE) & part.part
    # Sketch24 → Cut-Extrude13 (cut, up to next)
    with BuildSketch(Plane.ZY.offset(107.5), mode=Mode.PRIVATE) as cut_extrude13_sk5:
        with Locations((50, -13)):
            Circle(SKETCH24_R)
    cut_extrude13_tool5 = extrude(cut_extrude13_sk5.sketch, amount=-CUT_EXTRUDE13_REACH, mode=Mode.PRIVATE) & part.part
    # Sketch24 → Cut-Extrude13 (cut, up to next)
    with BuildSketch(Plane.ZY.offset(107.5), mode=Mode.PRIVATE) as cut_extrude13_sk6:
        with Locations((50, -27)):
            Circle(SKETCH24_R)
    cut_extrude13_tool6 = extrude(cut_extrude13_sk6.sketch, amount=-CUT_EXTRUDE13_REACH, mode=Mode.PRIVATE) & part.part
    add(cut_extrude13_tool1.solids().sort_by_distance((-107.5, -27, 0))[0], mode=Mode.SUBTRACT)
    add(cut_extrude13_tool2.solids().sort_by_distance((-107.5, -13, 0))[0], mode=Mode.SUBTRACT)
    add(cut_extrude13_tool3.solids().sort_by_distance((-107.5, -13, -50))[0], mode=Mode.SUBTRACT)
    add(cut_extrude13_tool4.solids().sort_by_distance((-107.5, -27, -50))[0], mode=Mode.SUBTRACT)
    add(cut_extrude13_tool5.solids().sort_by_distance((-107.5, -13, 50))[0], mode=Mode.SUBTRACT)
    add(cut_extrude13_tool6.solids().sort_by_distance((-107.5, -27, 50))[0], mode=Mode.SUBTRACT)

    # Croquis1 outside → Cortar-Extruir1 (cut, through all)
    with BuildSketch(Plane(origin=(0, 10, 0), x_dir=(1, 0, 0), z_dir=(0, 1, 0))):
        Rectangle(CROQUIS1_OUTSIDE_W, CROQUIS1_OUTSIDE_H)
        Polygon((-35.958399916, 33.309408121), (-71.919642521, 68.764154351), (-105.759618132, 34.440750518), (-69.798375526, -1.013995713), align=None, mode=Mode.SUBTRACT)
    extrude(amount=-CORTAR_EXTRUIR1_DEPTH, mode=Mode.SUBTRACT)

    # Croquis2 outside → Cortar-Extruir2 (cut, two sides: drawn at the far end of the back side and taken through both)
    with BuildSketch(Plane(origin=(-34.911135577, 0, 35.409866085), x_dir=(0.712103813967469, 0, 0.7020741827848282), z_dir=(-0.7020741827848282, 0, 0.712103813967469)).offset(-CORTAR_EXTRUIR2_DEPTH_BACK)):
        with Locations((-74.2415, -12.5)):
            Rectangle(CROQUIS2_OUTSIDE_W, CROQUIS2_OUTSIDE_H)
        with Locations((-74.24178921, 1)):
            Rectangle(CROQUIS2_OUTSIDE_W_2, CROQUIS2_OUTSIDE_H_2, mode=Mode.SUBTRACT)
    extrude(amount=CORTAR_EXTRUIR2_DEPTH + CORTAR_EXTRUIR2_DEPTH_BACK, mode=Mode.SUBTRACT)

    # Croquis3 outside → Cortar-Extruir3 (cut, two sides: drawn at the far end of the back side and taken through both)
    with BuildSketch(Plane.XZ.offset(8).offset(-CORTAR_EXTRUIR3_DEPTH_BACK)):
        with Locations((-70.859, -33.875)):
            Rectangle(CROQUIS3_OUTSIDE_W, CROQUIS3_OUTSIDE_H)
        Polygon((-74.959429756, -65.680941585), (-102.719830898, -37.523963284), (-102.676405366, -31.400963284), (-72.881588292, -2.025791521), (-66.758588292, -2.069217053), (-38.99818715, -30.226195355), (-39.041612682, -36.349195355), (-68.836429756, -65.724367117), align=None, mode=Mode.SUBTRACT)
    extrude(amount=CORTAR_EXTRUIR3_DEPTH + CORTAR_EXTRUIR3_DEPTH_BACK, mode=Mode.SUBTRACT)

    # Croquis7 → Saliente-Extruir1 (add)
    with BuildSketch(Plane.XZ.offset(8)):
        Polygon((-72.881588292, -2.025791521), (-102.676405366, -31.400963284), (-102.719830898, -37.523963284), (-74.959429756, -65.680941585), (-68.836429756, -65.724367117), (-39.041612682, -36.349195355), (-38.99818715, -30.226195355), (-66.758588292, -2.069217053), align=None)
        with BuildLine():
            ThreePointArc((-78.032702727, -23.394114734), (-60.355477768, -23.519485123), (-60.480848158, -41.196710083))
            Line((-60.480848158, -41.196710083), (-62.6171596, -43.302932631))
            ThreePointArc((-62.6171596, -43.302932631), (-80.294384559, -43.177562241), (-80.169014169, -25.500337282))
            Line((-80.169014169, -25.500337282), (-78.032702727, -23.394114734))
        make_face(mode=Mode.SUBTRACT)
        with BuildLine():
            ThreePointArc((-92.167035153, -35.548103602), (-94.429776853, -35.548103602), (-94.429776853, -33.285361902))
            Line((-94.429776853, -33.285361902), (-92.308456509, -31.164041558))
            ThreePointArc((-92.308456509, -31.164041558), (-90.045714809, -31.164041558), (-90.045714809, -33.426783258))
            Line((-90.045714809, -33.426783258), (-92.167035153, -35.548103602))
        make_face(mode=Mode.SUBTRACT)
        with BuildLine():
            ThreePointArc((-70.246724936, -57.468413818), (-72.509466636, -57.468413818), (-72.509466636, -55.205672119))
            Line((-72.509466636, -55.205672119), (-70.388146292, -53.084351775))
            ThreePointArc((-70.388146292, -53.084351775), (-68.125404593, -53.084351775), (-68.125404593, -55.347093475))
            Line((-68.125404593, -55.347093475), (-70.246724936, -57.468413818))
        make_face(mode=Mode.SUBTRACT)
        with BuildLine():
            ThreePointArc((-48.326414719, -35.548103602), (-50.589156419, -35.548103602), (-50.589156419, -33.285361902))
            Line((-50.589156419, -33.285361902), (-48.467836076, -31.164041558))
            ThreePointArc((-48.467836076, -31.164041558), (-46.205094376, -31.164041558), (-46.205094376, -33.426783258))
            Line((-46.205094376, -33.426783258), (-48.326414719, -35.548103602))
        make_face(mode=Mode.SUBTRACT)
        with BuildLine():
            ThreePointArc((-70.388146292, -9.243731341), (-68.125404593, -9.243731341), (-68.125404593, -11.506473041))
            Line((-68.125404593, -11.506473041), (-70.246724936, -13.627793385))
            ThreePointArc((-70.246724936, -13.627793385), (-72.509466636, -13.627793385), (-72.509466636, -11.365051685))
            Line((-72.509466636, -11.365051685), (-70.388146292, -9.243731341))
        make_face(mode=Mode.SUBTRACT)
    extrude(amount=SALIENTE_EXTRUIR1_DEPTH)


solid = part.part
